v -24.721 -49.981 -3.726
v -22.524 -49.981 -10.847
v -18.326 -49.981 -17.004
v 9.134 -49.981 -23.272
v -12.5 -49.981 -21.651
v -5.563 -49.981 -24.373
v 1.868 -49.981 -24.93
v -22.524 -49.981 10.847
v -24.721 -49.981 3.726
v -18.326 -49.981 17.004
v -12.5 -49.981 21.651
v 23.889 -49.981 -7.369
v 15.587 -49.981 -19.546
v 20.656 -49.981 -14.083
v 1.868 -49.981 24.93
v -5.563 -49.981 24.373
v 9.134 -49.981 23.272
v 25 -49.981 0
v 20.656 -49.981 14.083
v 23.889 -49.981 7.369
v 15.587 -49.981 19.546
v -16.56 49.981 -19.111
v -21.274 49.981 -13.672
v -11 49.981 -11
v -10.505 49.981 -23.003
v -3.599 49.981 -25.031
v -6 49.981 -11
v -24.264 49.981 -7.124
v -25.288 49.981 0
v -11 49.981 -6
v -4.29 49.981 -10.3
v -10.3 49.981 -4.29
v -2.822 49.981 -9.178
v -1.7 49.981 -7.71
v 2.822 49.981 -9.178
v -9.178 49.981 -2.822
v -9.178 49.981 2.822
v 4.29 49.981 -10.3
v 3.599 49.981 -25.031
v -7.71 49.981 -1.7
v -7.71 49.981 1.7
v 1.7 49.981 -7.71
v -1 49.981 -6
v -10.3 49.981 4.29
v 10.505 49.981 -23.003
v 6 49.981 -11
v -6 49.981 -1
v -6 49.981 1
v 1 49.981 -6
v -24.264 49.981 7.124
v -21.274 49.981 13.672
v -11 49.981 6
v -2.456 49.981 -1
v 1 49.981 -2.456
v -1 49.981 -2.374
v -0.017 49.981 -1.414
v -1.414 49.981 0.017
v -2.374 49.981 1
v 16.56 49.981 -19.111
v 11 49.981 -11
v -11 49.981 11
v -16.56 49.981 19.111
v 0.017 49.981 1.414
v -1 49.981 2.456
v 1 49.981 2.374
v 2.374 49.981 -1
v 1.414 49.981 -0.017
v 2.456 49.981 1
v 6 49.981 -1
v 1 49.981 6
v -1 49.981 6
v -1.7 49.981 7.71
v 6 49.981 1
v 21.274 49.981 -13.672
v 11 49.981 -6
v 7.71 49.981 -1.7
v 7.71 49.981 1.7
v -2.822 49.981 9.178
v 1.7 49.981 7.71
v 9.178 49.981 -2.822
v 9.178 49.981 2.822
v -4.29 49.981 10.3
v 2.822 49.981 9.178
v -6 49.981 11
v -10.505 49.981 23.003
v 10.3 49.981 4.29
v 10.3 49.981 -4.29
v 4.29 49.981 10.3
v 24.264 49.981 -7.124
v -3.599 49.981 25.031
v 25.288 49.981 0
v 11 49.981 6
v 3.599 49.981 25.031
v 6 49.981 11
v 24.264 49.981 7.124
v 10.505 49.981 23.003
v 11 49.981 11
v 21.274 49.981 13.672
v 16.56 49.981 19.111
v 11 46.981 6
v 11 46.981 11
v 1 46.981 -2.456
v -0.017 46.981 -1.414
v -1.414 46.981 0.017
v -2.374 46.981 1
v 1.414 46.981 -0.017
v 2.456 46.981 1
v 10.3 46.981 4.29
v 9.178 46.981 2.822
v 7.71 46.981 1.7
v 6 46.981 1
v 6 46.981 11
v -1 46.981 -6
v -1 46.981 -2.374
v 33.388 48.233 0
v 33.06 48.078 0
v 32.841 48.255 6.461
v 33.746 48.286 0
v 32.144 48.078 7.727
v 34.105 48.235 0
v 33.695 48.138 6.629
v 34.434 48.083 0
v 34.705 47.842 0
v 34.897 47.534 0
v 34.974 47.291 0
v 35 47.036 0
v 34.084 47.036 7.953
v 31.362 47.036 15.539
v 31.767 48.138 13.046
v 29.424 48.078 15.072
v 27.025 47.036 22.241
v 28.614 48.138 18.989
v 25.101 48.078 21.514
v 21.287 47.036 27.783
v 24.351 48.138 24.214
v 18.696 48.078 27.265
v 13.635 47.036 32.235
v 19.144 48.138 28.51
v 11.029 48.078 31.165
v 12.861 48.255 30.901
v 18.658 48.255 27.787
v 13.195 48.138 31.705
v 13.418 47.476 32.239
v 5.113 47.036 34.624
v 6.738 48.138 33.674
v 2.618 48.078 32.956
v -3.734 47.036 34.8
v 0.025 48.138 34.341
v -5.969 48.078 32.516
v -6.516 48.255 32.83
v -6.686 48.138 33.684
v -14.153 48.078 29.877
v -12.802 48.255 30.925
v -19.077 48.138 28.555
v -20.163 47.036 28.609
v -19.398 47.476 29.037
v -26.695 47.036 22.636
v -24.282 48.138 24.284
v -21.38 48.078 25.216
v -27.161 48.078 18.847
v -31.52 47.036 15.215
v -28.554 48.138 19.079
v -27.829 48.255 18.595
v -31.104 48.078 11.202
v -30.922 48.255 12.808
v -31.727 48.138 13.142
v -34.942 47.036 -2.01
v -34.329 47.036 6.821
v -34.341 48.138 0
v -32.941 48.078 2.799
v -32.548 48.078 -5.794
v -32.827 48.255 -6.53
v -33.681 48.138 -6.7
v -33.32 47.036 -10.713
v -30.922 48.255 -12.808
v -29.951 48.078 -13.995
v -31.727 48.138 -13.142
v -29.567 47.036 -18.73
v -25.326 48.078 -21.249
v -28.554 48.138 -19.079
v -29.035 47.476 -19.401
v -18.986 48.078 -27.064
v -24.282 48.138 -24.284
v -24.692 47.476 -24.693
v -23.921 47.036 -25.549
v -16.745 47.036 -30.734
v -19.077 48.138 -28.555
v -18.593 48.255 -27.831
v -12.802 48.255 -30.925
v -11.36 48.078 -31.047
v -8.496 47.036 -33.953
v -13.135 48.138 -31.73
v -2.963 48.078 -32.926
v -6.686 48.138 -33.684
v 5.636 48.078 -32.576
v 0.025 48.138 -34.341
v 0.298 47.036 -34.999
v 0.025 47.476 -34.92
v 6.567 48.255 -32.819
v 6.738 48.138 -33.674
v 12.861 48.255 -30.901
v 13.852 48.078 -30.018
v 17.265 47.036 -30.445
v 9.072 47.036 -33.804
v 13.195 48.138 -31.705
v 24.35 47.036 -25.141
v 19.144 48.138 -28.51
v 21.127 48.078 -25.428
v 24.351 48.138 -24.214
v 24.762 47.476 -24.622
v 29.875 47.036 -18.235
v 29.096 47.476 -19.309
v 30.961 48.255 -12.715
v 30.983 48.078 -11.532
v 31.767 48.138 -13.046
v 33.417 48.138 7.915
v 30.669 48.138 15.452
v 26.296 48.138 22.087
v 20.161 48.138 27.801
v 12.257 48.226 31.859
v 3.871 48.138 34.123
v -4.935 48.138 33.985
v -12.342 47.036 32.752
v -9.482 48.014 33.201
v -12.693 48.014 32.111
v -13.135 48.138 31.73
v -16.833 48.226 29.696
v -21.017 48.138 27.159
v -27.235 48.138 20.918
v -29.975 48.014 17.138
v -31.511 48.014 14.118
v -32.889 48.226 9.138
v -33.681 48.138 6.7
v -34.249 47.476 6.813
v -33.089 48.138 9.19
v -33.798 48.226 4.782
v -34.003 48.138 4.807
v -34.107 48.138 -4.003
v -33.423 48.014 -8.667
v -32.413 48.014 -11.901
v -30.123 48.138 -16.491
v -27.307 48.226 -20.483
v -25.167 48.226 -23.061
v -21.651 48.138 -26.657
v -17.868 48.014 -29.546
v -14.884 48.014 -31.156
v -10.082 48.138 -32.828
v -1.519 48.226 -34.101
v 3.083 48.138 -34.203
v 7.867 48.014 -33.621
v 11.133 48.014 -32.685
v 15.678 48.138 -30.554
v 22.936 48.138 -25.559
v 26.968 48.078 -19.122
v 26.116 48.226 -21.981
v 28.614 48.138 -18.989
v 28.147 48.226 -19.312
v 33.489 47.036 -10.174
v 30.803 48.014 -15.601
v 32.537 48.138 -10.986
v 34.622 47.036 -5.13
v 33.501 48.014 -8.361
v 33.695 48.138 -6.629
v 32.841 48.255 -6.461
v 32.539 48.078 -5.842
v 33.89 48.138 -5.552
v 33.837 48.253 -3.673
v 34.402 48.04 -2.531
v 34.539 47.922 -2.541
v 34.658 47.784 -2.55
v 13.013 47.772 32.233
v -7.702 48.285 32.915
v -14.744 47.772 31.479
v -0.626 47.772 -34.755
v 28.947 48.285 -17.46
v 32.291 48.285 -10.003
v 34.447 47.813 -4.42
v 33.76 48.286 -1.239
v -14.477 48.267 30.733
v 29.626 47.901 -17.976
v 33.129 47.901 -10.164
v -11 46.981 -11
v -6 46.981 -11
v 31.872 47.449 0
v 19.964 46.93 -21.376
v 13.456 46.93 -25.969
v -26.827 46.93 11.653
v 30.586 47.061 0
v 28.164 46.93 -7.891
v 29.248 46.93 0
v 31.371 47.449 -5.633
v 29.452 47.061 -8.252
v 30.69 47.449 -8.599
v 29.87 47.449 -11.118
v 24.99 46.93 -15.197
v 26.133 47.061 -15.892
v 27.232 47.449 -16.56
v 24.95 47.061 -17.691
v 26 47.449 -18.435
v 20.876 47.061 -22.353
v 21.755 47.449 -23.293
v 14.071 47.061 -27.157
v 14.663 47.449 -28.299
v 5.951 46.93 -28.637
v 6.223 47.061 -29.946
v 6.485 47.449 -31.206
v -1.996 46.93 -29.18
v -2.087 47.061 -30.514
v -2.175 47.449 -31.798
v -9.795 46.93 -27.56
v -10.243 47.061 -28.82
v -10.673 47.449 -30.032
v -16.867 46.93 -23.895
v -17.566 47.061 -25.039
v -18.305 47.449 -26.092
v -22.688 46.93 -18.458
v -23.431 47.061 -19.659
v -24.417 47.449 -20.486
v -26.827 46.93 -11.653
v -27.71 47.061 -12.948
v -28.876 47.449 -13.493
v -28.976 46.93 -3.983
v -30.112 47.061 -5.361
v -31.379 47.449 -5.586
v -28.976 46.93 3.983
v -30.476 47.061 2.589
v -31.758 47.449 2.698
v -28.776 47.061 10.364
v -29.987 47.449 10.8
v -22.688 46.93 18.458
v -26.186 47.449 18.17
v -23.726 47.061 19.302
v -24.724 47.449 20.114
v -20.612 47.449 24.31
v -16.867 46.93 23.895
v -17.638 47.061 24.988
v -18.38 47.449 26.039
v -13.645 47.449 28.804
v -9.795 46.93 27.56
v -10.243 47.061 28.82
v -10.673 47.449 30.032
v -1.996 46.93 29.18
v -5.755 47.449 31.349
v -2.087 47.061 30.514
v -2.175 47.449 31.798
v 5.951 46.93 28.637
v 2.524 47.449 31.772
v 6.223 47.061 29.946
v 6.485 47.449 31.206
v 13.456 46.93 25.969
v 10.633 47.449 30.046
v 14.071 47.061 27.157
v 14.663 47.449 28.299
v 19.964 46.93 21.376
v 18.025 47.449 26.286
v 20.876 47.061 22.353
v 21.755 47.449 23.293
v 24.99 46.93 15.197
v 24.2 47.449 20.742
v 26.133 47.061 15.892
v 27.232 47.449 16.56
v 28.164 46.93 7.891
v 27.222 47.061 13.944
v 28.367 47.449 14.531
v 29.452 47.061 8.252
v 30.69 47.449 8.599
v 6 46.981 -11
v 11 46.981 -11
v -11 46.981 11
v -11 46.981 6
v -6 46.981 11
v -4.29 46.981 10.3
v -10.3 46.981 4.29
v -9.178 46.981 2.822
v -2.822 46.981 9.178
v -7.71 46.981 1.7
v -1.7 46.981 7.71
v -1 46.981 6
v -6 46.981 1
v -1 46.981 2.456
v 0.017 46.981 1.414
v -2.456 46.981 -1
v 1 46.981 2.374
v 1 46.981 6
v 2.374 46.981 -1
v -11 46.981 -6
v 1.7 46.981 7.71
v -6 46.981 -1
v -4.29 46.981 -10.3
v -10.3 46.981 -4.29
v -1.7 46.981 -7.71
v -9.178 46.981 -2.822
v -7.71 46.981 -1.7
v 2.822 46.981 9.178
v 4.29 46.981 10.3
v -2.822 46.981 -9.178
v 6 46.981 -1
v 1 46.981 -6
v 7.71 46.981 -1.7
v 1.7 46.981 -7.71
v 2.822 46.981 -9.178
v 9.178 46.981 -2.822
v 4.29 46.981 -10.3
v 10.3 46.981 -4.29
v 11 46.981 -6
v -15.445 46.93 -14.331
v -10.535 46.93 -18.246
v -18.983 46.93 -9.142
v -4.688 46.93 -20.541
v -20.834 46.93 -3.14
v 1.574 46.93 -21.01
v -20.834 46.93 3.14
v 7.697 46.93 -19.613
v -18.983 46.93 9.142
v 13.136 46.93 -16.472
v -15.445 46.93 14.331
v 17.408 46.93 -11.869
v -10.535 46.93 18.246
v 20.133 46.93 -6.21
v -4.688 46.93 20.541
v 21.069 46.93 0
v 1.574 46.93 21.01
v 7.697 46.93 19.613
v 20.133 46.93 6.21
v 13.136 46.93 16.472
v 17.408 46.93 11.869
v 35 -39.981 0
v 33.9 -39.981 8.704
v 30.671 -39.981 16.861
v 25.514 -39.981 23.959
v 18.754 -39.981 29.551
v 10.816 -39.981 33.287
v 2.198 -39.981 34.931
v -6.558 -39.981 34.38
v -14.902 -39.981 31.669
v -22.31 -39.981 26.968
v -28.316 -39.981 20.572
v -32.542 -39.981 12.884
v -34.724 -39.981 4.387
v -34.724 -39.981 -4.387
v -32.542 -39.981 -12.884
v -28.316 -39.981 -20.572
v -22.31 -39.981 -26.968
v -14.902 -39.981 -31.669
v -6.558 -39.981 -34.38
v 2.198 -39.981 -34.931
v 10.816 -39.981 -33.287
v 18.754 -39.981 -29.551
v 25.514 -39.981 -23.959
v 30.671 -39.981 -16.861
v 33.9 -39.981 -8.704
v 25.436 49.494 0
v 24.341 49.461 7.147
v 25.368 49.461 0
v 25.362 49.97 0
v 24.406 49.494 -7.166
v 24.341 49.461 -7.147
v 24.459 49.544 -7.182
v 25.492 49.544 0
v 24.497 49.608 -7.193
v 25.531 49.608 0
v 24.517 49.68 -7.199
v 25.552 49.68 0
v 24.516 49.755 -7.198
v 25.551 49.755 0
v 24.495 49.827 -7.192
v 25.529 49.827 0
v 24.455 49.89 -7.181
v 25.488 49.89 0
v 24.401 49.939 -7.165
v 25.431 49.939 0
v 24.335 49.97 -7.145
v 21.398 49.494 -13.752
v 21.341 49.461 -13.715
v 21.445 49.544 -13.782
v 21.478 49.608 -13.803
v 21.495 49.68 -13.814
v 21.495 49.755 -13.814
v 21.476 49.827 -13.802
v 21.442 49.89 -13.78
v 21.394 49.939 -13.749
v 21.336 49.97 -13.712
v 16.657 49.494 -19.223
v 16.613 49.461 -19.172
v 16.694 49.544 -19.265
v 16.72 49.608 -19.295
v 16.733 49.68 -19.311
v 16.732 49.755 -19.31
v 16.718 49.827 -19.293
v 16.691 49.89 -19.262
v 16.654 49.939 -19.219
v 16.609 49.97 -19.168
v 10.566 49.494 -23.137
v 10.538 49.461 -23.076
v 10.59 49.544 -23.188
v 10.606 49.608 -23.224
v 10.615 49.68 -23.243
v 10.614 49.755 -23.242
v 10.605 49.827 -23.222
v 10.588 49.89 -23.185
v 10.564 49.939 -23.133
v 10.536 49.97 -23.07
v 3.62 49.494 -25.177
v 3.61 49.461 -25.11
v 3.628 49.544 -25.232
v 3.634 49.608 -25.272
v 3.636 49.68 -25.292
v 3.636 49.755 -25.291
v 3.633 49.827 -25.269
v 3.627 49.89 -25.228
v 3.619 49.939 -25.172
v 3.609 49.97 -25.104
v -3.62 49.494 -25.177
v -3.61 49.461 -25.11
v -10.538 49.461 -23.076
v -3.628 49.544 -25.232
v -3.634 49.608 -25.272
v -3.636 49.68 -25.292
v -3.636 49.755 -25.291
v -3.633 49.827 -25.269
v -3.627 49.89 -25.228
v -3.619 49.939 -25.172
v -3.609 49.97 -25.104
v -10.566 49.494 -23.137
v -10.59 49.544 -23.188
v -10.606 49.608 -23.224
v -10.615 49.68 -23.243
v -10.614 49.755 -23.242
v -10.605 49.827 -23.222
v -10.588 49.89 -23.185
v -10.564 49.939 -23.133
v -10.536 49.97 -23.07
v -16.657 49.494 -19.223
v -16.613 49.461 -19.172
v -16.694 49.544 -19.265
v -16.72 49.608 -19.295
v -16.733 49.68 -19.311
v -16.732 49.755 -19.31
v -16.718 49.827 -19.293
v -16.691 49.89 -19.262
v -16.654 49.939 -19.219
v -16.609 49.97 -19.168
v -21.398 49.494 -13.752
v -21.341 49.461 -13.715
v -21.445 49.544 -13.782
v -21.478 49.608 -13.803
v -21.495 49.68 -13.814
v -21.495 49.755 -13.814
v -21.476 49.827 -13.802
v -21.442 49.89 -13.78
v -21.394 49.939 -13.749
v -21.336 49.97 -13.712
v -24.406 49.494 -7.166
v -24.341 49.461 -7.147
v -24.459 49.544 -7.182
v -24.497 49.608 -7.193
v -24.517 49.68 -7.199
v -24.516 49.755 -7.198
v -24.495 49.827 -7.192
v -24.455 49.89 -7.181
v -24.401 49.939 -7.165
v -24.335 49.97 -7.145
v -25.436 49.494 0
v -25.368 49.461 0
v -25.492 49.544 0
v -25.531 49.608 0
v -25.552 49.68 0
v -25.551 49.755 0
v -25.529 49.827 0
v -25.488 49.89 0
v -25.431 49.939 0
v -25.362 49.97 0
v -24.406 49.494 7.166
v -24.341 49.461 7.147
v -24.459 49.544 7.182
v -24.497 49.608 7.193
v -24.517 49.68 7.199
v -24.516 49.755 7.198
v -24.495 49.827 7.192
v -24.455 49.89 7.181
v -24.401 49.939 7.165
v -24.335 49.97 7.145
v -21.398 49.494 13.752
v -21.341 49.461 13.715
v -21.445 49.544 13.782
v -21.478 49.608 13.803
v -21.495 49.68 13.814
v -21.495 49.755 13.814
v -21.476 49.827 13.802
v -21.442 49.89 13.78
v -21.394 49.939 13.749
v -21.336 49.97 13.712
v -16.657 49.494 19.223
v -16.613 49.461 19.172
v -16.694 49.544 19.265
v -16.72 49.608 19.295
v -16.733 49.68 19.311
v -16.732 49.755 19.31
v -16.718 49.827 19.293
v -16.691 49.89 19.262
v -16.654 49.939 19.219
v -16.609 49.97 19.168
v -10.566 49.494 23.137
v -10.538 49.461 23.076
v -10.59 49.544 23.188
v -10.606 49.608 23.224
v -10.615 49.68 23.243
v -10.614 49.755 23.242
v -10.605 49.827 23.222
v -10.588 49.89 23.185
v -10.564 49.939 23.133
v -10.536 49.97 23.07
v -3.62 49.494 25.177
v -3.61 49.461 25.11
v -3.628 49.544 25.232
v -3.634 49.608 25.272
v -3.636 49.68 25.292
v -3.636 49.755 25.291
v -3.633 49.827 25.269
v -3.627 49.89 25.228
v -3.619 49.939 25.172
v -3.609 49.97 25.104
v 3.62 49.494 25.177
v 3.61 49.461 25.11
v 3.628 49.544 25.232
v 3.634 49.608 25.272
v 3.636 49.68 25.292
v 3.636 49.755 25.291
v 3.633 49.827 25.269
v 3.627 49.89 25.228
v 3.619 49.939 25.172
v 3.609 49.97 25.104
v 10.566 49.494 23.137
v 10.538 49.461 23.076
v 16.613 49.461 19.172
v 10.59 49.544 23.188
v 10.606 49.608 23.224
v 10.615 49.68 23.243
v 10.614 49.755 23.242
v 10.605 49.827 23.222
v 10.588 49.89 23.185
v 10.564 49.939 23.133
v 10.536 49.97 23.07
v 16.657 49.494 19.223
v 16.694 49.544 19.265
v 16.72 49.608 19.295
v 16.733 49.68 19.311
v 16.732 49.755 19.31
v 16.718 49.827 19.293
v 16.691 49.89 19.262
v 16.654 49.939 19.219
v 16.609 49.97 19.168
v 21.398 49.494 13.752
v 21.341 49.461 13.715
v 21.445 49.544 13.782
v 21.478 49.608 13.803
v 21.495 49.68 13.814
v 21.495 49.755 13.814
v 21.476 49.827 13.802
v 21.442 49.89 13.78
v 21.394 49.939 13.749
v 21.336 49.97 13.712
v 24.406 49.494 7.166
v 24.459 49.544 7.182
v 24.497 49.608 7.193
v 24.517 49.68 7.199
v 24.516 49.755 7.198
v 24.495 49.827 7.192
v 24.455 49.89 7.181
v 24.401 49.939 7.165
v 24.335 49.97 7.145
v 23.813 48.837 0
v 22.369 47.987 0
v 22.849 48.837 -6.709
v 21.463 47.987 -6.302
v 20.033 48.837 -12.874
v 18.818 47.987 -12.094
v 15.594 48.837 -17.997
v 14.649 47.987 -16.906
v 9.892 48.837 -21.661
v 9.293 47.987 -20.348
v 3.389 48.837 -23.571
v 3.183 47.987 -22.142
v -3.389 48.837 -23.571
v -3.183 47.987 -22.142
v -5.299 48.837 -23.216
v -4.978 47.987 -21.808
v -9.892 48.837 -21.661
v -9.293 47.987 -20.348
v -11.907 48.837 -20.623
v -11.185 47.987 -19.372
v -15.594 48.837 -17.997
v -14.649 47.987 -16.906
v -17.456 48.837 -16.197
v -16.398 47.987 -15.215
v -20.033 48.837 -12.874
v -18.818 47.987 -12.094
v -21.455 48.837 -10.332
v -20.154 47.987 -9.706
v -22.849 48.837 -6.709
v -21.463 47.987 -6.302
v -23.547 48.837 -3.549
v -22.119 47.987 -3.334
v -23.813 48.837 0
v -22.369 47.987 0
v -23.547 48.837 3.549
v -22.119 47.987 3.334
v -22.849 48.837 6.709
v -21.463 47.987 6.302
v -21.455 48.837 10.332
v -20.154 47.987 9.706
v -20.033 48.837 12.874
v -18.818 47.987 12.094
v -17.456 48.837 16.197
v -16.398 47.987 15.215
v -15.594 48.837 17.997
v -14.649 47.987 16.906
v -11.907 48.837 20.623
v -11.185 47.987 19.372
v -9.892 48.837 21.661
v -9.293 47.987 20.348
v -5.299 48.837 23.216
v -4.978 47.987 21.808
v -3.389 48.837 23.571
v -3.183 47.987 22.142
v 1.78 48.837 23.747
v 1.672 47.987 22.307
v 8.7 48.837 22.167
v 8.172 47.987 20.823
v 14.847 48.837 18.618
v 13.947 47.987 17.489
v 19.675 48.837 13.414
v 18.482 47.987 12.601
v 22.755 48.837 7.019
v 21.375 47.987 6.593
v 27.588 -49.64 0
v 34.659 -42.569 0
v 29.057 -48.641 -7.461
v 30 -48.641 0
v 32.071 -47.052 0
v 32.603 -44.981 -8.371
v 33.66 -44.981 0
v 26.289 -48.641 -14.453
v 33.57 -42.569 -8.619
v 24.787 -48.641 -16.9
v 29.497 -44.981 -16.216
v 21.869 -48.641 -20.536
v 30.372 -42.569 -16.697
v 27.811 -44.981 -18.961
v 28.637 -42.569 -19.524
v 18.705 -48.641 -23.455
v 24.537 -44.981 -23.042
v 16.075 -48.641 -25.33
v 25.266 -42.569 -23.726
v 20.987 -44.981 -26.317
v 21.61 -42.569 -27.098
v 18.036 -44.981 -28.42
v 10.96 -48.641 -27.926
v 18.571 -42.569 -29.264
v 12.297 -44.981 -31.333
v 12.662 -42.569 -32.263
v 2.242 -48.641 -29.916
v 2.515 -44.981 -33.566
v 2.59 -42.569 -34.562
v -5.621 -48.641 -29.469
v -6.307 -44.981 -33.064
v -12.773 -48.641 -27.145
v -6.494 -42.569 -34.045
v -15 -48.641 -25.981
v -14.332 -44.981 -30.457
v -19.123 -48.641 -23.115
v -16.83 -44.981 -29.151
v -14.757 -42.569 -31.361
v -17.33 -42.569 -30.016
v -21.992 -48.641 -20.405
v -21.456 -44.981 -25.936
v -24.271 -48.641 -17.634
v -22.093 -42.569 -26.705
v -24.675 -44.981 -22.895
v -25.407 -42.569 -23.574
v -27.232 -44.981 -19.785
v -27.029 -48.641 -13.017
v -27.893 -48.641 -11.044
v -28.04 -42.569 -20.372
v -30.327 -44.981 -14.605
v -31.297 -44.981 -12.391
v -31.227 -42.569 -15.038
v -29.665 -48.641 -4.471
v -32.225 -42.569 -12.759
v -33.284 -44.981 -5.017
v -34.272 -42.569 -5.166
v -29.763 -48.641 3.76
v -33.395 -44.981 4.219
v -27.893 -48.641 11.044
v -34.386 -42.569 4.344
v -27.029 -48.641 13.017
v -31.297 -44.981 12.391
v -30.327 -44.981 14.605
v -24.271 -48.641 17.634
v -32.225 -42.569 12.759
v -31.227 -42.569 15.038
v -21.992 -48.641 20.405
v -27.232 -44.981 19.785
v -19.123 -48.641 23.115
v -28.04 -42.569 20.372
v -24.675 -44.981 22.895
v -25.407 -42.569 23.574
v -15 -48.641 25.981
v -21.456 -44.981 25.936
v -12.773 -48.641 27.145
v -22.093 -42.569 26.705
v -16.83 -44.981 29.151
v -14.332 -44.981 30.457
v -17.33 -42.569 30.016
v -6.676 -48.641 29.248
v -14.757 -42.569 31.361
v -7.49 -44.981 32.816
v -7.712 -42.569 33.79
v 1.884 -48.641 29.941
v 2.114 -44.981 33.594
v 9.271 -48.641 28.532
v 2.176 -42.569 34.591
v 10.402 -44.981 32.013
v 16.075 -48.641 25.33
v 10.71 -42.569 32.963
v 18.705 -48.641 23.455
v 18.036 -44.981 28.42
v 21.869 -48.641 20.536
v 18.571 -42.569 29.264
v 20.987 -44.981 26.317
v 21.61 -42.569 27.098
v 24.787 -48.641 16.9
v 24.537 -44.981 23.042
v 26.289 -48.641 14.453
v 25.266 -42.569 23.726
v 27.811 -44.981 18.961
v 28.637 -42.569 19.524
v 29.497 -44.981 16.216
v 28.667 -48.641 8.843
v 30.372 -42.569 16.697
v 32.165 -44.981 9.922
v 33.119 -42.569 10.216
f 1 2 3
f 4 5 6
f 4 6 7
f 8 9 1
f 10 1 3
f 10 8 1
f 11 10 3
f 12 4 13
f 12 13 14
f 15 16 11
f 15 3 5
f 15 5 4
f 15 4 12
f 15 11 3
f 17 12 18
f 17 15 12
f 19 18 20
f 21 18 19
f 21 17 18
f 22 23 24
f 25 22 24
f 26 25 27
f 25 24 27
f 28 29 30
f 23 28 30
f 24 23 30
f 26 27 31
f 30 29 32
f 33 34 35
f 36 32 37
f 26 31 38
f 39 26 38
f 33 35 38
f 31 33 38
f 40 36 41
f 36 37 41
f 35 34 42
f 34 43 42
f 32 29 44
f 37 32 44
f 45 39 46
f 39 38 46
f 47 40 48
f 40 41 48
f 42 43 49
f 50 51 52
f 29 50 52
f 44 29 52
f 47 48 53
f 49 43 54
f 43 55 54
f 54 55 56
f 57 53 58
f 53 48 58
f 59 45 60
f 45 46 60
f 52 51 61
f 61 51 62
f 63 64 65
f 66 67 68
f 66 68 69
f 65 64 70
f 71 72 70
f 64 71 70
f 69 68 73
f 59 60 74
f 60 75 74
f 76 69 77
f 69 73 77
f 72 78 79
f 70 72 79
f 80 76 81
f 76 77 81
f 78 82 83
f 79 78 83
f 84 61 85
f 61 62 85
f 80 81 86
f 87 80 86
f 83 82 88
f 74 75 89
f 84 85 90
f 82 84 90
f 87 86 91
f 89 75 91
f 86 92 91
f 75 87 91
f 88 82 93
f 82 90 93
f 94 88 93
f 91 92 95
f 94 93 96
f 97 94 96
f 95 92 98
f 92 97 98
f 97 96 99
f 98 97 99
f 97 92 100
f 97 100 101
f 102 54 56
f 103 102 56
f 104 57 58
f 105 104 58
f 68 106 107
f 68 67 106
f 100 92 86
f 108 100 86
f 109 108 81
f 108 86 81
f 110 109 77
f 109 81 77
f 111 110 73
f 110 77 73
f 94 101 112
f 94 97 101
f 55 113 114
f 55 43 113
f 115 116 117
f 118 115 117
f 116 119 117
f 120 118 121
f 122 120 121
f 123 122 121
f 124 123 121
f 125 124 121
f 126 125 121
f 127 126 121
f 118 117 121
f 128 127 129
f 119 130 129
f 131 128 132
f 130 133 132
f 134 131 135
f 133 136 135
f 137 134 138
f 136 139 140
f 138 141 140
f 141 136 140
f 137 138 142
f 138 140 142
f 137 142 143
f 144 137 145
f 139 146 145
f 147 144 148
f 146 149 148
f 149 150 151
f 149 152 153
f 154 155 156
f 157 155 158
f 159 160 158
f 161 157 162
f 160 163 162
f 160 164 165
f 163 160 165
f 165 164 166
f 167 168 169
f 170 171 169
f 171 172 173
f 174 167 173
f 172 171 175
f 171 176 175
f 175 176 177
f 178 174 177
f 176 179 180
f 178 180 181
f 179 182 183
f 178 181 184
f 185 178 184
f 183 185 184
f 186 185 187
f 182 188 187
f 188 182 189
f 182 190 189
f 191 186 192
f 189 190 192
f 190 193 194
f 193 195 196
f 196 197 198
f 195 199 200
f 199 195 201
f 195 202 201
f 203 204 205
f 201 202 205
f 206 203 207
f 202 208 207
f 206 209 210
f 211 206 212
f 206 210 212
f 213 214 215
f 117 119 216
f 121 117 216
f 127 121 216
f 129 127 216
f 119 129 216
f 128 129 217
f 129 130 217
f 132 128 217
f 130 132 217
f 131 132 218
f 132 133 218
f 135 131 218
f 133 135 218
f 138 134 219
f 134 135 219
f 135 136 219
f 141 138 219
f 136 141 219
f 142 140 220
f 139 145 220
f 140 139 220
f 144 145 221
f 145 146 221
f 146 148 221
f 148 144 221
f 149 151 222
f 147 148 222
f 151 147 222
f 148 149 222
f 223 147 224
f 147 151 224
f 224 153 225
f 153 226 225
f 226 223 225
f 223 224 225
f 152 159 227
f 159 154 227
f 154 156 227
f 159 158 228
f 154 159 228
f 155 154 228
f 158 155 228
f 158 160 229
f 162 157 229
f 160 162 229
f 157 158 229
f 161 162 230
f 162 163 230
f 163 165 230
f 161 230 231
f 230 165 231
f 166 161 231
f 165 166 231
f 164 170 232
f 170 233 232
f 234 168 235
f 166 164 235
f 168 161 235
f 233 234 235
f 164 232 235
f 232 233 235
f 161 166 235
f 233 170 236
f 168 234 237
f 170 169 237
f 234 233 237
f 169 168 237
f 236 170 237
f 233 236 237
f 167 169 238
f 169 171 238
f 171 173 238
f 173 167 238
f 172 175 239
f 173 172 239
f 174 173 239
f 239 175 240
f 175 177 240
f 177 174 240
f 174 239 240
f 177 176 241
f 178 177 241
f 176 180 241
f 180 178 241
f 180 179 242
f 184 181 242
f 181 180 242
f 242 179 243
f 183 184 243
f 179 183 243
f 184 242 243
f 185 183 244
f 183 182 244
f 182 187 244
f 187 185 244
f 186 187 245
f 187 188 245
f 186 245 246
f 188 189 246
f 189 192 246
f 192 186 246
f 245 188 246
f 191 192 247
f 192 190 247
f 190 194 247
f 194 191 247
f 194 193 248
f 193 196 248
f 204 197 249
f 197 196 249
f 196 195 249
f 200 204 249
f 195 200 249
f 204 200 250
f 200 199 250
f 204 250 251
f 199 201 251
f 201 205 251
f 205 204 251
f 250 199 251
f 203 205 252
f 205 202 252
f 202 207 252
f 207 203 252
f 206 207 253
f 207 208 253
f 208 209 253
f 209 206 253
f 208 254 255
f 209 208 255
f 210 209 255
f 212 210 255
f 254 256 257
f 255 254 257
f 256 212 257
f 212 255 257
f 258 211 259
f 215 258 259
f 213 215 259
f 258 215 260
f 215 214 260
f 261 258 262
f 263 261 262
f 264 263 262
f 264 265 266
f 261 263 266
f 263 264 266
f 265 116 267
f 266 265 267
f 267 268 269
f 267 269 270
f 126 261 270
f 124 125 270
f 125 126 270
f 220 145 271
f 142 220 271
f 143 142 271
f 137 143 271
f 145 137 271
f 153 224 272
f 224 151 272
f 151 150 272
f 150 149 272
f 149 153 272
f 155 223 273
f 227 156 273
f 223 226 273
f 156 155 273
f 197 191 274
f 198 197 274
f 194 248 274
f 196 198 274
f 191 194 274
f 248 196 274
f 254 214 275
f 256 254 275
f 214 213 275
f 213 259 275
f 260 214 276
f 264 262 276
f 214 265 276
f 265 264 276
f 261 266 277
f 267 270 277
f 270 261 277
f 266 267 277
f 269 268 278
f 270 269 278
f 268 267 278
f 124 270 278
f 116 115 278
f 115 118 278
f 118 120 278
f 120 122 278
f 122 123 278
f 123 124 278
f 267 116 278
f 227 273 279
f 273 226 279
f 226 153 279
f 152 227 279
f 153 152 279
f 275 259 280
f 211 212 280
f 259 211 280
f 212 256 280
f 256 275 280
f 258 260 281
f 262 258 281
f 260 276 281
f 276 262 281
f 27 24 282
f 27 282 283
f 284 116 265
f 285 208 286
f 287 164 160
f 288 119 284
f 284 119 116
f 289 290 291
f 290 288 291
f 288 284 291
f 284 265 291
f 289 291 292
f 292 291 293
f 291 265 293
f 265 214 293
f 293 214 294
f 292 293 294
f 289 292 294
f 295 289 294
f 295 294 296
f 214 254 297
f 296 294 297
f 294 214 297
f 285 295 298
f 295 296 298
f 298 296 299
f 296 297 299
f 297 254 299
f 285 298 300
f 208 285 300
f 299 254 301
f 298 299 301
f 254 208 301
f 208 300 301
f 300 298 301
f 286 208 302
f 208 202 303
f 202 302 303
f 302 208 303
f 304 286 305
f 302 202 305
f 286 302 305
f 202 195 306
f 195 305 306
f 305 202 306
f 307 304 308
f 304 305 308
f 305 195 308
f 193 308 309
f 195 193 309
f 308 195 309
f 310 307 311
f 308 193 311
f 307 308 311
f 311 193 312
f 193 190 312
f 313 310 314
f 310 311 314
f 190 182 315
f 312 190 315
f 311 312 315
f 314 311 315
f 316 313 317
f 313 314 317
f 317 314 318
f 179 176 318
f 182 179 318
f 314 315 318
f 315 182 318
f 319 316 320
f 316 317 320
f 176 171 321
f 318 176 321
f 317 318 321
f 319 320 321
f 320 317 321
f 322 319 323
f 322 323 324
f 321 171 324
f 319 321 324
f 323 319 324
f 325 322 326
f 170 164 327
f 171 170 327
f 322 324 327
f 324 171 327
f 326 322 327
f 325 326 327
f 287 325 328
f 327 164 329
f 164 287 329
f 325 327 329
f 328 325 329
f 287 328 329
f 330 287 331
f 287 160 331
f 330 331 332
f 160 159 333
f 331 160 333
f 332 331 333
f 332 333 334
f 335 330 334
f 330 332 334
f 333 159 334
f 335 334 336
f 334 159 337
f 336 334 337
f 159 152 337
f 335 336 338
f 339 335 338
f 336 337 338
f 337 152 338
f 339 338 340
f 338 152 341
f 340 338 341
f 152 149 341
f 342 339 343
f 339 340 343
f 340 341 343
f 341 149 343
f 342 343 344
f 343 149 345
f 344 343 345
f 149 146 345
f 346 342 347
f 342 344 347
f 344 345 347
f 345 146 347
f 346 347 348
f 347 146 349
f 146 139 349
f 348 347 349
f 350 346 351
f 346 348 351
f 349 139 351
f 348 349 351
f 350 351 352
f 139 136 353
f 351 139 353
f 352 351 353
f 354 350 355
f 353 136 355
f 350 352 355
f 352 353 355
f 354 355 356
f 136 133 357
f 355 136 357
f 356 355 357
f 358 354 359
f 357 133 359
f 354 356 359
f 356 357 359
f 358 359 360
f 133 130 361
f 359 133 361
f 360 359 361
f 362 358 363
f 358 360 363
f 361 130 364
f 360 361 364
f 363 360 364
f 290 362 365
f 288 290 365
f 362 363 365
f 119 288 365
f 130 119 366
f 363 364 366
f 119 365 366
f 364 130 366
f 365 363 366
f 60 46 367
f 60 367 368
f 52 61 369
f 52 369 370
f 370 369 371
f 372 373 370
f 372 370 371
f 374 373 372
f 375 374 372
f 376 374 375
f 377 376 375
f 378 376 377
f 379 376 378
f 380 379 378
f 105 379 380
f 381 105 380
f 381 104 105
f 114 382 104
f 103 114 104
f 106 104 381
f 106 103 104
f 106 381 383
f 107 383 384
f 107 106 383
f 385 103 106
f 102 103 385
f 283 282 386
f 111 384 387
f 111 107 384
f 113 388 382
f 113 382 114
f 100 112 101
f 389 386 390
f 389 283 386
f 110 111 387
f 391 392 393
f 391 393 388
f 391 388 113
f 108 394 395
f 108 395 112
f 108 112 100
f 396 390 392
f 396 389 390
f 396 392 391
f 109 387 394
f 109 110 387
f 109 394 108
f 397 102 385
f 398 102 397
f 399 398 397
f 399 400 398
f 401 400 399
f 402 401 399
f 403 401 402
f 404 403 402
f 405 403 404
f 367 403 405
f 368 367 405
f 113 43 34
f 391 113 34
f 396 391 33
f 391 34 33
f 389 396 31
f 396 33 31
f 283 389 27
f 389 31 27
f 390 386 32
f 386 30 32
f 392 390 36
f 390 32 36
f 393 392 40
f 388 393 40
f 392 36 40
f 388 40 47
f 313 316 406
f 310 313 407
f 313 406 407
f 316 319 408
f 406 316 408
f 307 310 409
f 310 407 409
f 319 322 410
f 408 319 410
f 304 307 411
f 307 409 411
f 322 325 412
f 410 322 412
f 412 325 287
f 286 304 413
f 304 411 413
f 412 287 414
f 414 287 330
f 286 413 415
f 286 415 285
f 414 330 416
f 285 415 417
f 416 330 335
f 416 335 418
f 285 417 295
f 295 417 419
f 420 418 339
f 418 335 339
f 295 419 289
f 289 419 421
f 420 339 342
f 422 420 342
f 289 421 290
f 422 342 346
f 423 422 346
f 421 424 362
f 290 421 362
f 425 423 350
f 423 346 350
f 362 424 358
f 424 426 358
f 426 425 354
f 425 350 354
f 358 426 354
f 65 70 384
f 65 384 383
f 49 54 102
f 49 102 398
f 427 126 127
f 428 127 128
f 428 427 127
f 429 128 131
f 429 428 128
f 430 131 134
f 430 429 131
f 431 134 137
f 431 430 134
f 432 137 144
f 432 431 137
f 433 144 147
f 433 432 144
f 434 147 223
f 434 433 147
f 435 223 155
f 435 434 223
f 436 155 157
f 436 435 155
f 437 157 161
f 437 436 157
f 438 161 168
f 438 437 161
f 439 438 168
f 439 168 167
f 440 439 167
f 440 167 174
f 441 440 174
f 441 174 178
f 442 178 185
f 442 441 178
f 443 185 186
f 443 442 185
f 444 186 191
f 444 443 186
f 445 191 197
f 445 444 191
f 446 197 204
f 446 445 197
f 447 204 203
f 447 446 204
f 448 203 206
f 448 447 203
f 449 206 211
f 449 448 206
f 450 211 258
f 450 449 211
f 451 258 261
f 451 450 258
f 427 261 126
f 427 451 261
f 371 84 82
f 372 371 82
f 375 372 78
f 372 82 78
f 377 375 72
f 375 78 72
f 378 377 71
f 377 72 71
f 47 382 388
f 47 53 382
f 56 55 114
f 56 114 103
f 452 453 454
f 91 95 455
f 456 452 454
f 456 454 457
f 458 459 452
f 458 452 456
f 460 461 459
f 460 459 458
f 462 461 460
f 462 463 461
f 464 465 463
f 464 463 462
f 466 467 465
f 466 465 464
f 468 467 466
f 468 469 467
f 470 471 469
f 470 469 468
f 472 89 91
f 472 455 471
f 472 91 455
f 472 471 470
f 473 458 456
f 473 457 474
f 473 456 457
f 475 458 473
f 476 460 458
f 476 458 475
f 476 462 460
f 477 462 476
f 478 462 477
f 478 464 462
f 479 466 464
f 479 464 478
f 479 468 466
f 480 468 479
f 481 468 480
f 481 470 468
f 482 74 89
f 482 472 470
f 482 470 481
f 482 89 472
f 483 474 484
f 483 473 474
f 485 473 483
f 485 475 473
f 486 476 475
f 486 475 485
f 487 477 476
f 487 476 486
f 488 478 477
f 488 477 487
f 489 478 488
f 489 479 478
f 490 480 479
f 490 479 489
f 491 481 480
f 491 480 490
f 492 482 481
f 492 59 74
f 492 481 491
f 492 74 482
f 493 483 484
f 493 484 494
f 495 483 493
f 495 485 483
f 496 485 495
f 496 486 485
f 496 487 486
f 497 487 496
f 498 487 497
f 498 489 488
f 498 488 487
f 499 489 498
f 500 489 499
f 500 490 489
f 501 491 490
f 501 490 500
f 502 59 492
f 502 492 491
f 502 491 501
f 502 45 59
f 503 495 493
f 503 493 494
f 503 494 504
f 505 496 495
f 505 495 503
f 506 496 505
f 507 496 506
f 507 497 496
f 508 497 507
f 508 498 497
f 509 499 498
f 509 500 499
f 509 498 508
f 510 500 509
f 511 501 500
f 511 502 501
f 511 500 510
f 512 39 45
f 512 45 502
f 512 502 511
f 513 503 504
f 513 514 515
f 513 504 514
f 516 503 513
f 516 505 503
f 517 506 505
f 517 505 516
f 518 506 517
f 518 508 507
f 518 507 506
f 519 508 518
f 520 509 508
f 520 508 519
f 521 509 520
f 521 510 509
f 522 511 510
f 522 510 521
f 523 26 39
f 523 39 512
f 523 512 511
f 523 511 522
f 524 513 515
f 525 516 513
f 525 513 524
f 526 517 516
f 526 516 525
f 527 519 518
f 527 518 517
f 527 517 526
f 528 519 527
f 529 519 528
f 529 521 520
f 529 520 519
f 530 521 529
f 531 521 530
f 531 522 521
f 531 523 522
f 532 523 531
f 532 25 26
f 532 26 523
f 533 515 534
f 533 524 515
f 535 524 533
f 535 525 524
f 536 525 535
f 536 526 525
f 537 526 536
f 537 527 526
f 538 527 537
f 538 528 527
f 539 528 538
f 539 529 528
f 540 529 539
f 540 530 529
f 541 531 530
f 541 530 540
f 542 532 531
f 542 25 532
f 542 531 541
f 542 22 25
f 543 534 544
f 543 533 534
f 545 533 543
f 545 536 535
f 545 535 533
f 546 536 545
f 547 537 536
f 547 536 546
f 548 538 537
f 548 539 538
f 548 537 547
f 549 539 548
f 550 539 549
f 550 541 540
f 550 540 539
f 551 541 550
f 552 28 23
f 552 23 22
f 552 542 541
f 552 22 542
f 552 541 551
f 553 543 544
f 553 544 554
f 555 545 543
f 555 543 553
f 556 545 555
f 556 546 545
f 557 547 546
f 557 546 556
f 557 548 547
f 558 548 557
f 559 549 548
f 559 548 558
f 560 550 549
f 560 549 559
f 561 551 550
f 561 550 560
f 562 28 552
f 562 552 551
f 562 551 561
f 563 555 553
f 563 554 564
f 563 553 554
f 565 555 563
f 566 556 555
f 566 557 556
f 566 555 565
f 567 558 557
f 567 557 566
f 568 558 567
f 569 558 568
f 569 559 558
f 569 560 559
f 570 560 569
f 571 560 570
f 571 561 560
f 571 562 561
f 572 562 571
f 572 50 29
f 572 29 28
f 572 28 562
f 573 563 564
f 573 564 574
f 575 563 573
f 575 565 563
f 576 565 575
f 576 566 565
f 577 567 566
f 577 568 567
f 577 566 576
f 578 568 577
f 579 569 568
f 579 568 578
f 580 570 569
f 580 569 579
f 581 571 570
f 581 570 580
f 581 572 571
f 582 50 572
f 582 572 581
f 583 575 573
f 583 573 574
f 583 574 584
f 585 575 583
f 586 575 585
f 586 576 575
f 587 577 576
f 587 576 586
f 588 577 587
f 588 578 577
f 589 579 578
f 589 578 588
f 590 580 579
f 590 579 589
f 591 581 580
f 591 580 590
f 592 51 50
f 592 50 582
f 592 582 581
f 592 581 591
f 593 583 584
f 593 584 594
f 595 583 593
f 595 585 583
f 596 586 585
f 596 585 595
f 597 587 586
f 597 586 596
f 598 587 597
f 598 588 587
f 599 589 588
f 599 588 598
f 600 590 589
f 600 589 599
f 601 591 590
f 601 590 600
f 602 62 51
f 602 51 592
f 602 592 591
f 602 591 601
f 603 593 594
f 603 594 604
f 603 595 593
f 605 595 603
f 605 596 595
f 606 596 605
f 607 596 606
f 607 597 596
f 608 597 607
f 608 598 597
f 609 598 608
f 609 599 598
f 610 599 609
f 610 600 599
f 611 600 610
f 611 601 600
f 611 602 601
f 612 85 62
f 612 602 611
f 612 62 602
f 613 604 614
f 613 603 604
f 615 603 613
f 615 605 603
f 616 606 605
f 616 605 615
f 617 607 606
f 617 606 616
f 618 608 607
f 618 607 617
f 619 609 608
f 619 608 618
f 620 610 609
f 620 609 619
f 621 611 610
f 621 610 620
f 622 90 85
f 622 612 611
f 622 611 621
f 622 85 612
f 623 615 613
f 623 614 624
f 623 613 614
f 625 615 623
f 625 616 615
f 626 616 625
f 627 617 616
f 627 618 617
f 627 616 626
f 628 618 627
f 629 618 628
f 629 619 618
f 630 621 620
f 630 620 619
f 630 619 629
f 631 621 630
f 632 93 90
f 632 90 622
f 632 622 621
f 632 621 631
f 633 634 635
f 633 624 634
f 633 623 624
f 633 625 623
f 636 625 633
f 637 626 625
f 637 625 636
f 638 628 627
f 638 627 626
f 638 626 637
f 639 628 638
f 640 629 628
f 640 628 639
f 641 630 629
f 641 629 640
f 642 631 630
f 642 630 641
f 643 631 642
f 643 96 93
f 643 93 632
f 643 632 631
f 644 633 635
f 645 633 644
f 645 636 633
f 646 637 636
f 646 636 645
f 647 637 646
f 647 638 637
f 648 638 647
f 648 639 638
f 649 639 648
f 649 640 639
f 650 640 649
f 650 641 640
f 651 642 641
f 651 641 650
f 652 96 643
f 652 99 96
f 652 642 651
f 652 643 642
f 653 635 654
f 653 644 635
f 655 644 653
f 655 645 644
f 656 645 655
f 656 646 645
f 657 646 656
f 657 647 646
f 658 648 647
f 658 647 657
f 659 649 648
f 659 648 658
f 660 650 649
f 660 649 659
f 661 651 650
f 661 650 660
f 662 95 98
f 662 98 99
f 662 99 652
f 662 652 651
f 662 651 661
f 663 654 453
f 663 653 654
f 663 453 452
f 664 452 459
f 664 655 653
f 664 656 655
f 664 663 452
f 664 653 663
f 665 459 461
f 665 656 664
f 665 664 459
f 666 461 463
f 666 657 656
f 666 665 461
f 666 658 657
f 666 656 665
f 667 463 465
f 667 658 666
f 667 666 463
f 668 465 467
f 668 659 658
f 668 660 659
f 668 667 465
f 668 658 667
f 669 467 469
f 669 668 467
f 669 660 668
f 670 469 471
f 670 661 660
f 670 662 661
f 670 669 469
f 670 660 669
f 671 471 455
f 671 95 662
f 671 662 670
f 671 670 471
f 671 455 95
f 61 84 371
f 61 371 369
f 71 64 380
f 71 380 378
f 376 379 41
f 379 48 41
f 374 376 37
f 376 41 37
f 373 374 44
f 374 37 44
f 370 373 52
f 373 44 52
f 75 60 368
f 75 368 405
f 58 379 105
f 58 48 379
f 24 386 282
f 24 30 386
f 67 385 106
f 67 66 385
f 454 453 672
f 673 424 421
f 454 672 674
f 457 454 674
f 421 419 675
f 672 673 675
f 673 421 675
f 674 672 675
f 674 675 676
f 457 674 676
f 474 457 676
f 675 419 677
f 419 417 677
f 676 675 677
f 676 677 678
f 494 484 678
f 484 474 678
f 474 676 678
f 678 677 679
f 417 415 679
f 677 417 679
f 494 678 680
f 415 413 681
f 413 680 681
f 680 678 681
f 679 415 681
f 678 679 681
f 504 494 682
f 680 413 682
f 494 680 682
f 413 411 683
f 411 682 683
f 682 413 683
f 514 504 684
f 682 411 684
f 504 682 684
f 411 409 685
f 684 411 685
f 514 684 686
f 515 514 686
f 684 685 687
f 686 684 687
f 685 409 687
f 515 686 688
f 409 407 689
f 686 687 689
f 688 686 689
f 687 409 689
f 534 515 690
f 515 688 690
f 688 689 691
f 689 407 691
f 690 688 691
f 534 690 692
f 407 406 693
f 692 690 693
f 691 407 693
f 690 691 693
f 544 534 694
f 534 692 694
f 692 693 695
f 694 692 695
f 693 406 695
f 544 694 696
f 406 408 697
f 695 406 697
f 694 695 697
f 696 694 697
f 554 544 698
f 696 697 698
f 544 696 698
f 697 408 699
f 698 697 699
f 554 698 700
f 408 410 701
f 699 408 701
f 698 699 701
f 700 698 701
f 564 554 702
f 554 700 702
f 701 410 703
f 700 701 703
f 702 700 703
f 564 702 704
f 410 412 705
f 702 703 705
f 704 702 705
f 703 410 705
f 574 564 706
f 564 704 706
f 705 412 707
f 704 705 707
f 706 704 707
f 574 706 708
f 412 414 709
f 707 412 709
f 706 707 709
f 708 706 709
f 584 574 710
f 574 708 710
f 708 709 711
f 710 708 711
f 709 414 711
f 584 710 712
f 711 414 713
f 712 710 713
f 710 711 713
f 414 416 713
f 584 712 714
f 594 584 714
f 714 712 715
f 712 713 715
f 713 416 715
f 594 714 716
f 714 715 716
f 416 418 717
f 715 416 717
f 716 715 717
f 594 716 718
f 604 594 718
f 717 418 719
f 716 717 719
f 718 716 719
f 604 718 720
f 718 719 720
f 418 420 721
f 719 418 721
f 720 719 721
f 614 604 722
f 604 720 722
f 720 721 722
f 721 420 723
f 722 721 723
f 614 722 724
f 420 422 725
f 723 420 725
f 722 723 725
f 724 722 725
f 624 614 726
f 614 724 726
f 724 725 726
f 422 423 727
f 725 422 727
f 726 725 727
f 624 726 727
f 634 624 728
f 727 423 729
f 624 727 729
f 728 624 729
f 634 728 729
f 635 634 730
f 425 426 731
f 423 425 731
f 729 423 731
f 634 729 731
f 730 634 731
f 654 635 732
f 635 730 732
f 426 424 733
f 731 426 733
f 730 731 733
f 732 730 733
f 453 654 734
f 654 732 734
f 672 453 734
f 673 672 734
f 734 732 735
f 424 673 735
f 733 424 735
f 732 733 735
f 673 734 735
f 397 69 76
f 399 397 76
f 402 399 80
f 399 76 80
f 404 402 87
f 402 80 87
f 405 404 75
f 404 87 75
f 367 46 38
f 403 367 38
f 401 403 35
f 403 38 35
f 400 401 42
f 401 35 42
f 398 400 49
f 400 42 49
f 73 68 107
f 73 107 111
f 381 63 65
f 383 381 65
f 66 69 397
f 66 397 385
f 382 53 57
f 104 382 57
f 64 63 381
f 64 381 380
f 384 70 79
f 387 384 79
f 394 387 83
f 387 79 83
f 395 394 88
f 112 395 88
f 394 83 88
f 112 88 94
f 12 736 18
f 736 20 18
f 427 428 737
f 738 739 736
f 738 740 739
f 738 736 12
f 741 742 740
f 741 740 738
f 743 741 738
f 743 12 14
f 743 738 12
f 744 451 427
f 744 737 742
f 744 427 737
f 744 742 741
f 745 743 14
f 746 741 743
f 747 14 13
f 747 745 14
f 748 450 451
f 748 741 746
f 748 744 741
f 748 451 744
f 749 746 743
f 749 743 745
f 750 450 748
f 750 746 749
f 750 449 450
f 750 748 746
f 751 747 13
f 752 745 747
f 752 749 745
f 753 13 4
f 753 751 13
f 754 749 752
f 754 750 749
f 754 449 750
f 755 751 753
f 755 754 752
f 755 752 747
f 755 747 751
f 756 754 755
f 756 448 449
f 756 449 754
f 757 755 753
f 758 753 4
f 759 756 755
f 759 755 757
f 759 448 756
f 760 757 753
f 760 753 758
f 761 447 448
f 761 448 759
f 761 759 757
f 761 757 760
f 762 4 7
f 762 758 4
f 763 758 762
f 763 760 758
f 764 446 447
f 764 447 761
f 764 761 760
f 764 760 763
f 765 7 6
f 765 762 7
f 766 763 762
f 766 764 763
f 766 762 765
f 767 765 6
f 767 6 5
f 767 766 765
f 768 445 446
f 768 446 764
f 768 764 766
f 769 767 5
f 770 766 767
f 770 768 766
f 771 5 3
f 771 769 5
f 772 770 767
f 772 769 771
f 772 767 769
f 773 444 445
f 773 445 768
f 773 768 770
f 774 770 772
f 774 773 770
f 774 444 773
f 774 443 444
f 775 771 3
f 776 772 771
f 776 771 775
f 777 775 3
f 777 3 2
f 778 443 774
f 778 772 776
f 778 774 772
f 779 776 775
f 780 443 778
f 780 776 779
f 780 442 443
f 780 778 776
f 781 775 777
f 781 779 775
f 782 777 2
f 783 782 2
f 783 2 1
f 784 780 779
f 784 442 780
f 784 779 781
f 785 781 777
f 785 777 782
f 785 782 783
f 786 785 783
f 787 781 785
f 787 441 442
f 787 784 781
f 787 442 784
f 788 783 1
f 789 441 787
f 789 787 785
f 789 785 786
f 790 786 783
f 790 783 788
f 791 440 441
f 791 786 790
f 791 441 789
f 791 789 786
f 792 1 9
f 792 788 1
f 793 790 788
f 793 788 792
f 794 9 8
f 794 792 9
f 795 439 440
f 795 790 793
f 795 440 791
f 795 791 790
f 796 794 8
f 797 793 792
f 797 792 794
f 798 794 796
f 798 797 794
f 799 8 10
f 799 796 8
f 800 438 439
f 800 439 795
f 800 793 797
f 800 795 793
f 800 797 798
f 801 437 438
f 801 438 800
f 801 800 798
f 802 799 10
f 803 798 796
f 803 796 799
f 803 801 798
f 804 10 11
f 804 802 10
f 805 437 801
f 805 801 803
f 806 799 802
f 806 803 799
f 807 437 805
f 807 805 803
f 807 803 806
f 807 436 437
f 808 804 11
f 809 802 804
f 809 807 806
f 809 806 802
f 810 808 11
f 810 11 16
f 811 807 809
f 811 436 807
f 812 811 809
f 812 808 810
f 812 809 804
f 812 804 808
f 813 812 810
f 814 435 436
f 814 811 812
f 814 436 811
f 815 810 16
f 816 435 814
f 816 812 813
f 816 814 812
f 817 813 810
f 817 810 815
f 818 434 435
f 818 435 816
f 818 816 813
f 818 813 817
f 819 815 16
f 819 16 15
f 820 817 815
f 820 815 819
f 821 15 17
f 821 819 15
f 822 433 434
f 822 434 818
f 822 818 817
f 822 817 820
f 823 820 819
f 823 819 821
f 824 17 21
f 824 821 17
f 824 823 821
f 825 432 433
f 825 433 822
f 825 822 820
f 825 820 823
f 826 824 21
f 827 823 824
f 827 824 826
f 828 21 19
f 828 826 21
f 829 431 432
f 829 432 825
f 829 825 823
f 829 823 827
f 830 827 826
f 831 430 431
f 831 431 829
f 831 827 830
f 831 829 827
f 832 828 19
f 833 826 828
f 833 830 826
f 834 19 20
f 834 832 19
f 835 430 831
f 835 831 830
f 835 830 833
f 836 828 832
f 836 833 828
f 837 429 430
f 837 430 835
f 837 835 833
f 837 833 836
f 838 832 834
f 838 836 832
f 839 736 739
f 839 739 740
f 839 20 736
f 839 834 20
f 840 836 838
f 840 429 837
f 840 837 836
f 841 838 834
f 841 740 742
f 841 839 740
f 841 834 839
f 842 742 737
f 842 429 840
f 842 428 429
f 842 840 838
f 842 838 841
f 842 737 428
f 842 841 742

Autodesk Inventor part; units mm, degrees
ref_plane "YZ Plane" through (0, 0, 0) normal (1, 0, 0) x (0, 1, 0)
ref_plane "XZ Plane" through (0, 0, 0) normal (0, 1, 0) x (-1, 0, 0)
ref_plane "XY Plane" through (0, 0, 0) normal (0, 0, 1) x (1, 0, 0)
sketch "Sketch1" plane through (0, 0, 0) normal (0, 0, 1) x (1, 0, 0)
  line L0 (0, 49.9808) -> (25.2879, 49.9808)
  line L1 (35, 50.0192) -> (35, -39.9808)
  line L2 (25, -49.9808) -> (0, -49.9808)
  line L3 (0, -49.9808) -> (0, 49.9808)
  line L4 (0, 49.9808) -> (0, 0)
  line L5 (21.0691, 46.9303) -> (29.2483, 46.9303)
  arc A0 (29.2483, 46.9303) -> (35, 50.0192) centre (29.2483, 53.8298) ccw
  arc A1 (25.3681, 49.4613) -> (21.0691, 46.9303) centre (28.7319, 38.8314) ccw
  line L6 (0, 93.4458) -> (0, -94.9165) construction
  arc A2 (25.3681, 49.4613) -> (25.2879, 49.9808) centre (25.2879, 49.7149) ccw
  arc A3 (25, -49.9808) -> (35, -39.9808) centre (25, -39.9808) ccw
  point P0 (35, -49.9808)
  dimension "d0" = 35
  dimension "d1" = 100
  dimension "d3" = 10
revolve "Revolution1" add sketch "Sketch1" angle 360 about axis through (0, 93.4458, 0) along (0, -1, 0)
sketch "Sketch2" plane through (0, 49.9808, 0) normal (0, 1, 0) x (1, 0, 0)
  line L0 (-1, 1) -> (-11, 1)
  line L1 (-11, 1) -> (-11, 11)
  line L2 (-11, 11) -> (-1, 11)
  line L3 (-1, 11) -> (-1, 1)
  arc A0 (-11, 6) -> (-6, 1) centre (-4.228, 7.772) ccw
  arc A1 (-1, 6) -> (-6, 11) centre (-7.772, 4.228) ccw
  line L4 (-1, -1) -> (-1, -11)
  line L5 (-1, -11) -> (-11, -11)
  line L6 (-11, -11) -> (-11, -1)
  line L7 (-11, -1) -> (-1, -1)
  arc A2 (-6, -11) -> (-1, -6) centre (-7.772, -4.228) ccw
  arc A3 (-6, -1) -> (-11, -6) centre (-4.228, -7.772) ccw
  line L8 (1, -1) -> (11, -1)
  line L9 (11, -1) -> (11, -11)
  line L10 (11, -11) -> (1, -11)
  line L11 (1, -11) -> (1, -1)
  arc A4 (11, -6) -> (6, -1) centre (4.228, -7.772) ccw
  arc A5 (1, -6) -> (6, -11) centre (7.772, -4.228) ccw
  line L12 (1, 1) -> (1, 11)
  line L13 (1, 11) -> (11, 11)
  line L14 (11, 11) -> (11, 1)
  line L15 (11, 1) -> (1, 1)
  arc A6 (6, 11) -> (1, 6) centre (7.772, 4.228) ccw
  arc A7 (6, 1) -> (11, 6) centre (4.228, 7.772) ccw
  line L16 (1, 2.456) -> (-0.0171, 1.4141)
  line L17 (-1.4141, -0.0171) -> (-2.3736, -1)
  line L18 (2.3736, 1) -> (1.4141, 0.0171)
  line L19 (0.0171, -1.4141) -> (-1, -2.456)
  line L20 (-2.456, 1) -> (-1.4141, -0.0171)
  line L21 (0.0171, -1.4141) -> (1, -2.3736)
  line L22 (-1, 2.3736) -> (-0.0171, 1.4141)
  line L23 (1.4141, 0.0171) -> (2.456, -1)
  point P0 (0, 0)
  point P1 (0, 0)
  dimension "d4" = 10
  dimension "d5" = 10
  dimension "d6" = 1
  dimension "d7" = 1
  dimension "d8" = 7
  dimension "d10" = 7
  dimension "d13" = 360
extrude "Extrusion1" cut sketch "Sketch2" against normal blind 3 contours L3 L22 L16 L12 L15 L18 L23 L8 L11 L21 L19 L4 L7 L17 L20 L0 | L0 A0 L1 L2 A1 L3 | L7 L4 A2 L5 L6 A3 | L12 A6 L13 L14 A7 L15 | L11 L8 A4 L9 L10 A5
fillet "Fillet1" radius 1.25 1 edges at (-35, 50.0192, 0)
properties part number "Audio Speaker"
